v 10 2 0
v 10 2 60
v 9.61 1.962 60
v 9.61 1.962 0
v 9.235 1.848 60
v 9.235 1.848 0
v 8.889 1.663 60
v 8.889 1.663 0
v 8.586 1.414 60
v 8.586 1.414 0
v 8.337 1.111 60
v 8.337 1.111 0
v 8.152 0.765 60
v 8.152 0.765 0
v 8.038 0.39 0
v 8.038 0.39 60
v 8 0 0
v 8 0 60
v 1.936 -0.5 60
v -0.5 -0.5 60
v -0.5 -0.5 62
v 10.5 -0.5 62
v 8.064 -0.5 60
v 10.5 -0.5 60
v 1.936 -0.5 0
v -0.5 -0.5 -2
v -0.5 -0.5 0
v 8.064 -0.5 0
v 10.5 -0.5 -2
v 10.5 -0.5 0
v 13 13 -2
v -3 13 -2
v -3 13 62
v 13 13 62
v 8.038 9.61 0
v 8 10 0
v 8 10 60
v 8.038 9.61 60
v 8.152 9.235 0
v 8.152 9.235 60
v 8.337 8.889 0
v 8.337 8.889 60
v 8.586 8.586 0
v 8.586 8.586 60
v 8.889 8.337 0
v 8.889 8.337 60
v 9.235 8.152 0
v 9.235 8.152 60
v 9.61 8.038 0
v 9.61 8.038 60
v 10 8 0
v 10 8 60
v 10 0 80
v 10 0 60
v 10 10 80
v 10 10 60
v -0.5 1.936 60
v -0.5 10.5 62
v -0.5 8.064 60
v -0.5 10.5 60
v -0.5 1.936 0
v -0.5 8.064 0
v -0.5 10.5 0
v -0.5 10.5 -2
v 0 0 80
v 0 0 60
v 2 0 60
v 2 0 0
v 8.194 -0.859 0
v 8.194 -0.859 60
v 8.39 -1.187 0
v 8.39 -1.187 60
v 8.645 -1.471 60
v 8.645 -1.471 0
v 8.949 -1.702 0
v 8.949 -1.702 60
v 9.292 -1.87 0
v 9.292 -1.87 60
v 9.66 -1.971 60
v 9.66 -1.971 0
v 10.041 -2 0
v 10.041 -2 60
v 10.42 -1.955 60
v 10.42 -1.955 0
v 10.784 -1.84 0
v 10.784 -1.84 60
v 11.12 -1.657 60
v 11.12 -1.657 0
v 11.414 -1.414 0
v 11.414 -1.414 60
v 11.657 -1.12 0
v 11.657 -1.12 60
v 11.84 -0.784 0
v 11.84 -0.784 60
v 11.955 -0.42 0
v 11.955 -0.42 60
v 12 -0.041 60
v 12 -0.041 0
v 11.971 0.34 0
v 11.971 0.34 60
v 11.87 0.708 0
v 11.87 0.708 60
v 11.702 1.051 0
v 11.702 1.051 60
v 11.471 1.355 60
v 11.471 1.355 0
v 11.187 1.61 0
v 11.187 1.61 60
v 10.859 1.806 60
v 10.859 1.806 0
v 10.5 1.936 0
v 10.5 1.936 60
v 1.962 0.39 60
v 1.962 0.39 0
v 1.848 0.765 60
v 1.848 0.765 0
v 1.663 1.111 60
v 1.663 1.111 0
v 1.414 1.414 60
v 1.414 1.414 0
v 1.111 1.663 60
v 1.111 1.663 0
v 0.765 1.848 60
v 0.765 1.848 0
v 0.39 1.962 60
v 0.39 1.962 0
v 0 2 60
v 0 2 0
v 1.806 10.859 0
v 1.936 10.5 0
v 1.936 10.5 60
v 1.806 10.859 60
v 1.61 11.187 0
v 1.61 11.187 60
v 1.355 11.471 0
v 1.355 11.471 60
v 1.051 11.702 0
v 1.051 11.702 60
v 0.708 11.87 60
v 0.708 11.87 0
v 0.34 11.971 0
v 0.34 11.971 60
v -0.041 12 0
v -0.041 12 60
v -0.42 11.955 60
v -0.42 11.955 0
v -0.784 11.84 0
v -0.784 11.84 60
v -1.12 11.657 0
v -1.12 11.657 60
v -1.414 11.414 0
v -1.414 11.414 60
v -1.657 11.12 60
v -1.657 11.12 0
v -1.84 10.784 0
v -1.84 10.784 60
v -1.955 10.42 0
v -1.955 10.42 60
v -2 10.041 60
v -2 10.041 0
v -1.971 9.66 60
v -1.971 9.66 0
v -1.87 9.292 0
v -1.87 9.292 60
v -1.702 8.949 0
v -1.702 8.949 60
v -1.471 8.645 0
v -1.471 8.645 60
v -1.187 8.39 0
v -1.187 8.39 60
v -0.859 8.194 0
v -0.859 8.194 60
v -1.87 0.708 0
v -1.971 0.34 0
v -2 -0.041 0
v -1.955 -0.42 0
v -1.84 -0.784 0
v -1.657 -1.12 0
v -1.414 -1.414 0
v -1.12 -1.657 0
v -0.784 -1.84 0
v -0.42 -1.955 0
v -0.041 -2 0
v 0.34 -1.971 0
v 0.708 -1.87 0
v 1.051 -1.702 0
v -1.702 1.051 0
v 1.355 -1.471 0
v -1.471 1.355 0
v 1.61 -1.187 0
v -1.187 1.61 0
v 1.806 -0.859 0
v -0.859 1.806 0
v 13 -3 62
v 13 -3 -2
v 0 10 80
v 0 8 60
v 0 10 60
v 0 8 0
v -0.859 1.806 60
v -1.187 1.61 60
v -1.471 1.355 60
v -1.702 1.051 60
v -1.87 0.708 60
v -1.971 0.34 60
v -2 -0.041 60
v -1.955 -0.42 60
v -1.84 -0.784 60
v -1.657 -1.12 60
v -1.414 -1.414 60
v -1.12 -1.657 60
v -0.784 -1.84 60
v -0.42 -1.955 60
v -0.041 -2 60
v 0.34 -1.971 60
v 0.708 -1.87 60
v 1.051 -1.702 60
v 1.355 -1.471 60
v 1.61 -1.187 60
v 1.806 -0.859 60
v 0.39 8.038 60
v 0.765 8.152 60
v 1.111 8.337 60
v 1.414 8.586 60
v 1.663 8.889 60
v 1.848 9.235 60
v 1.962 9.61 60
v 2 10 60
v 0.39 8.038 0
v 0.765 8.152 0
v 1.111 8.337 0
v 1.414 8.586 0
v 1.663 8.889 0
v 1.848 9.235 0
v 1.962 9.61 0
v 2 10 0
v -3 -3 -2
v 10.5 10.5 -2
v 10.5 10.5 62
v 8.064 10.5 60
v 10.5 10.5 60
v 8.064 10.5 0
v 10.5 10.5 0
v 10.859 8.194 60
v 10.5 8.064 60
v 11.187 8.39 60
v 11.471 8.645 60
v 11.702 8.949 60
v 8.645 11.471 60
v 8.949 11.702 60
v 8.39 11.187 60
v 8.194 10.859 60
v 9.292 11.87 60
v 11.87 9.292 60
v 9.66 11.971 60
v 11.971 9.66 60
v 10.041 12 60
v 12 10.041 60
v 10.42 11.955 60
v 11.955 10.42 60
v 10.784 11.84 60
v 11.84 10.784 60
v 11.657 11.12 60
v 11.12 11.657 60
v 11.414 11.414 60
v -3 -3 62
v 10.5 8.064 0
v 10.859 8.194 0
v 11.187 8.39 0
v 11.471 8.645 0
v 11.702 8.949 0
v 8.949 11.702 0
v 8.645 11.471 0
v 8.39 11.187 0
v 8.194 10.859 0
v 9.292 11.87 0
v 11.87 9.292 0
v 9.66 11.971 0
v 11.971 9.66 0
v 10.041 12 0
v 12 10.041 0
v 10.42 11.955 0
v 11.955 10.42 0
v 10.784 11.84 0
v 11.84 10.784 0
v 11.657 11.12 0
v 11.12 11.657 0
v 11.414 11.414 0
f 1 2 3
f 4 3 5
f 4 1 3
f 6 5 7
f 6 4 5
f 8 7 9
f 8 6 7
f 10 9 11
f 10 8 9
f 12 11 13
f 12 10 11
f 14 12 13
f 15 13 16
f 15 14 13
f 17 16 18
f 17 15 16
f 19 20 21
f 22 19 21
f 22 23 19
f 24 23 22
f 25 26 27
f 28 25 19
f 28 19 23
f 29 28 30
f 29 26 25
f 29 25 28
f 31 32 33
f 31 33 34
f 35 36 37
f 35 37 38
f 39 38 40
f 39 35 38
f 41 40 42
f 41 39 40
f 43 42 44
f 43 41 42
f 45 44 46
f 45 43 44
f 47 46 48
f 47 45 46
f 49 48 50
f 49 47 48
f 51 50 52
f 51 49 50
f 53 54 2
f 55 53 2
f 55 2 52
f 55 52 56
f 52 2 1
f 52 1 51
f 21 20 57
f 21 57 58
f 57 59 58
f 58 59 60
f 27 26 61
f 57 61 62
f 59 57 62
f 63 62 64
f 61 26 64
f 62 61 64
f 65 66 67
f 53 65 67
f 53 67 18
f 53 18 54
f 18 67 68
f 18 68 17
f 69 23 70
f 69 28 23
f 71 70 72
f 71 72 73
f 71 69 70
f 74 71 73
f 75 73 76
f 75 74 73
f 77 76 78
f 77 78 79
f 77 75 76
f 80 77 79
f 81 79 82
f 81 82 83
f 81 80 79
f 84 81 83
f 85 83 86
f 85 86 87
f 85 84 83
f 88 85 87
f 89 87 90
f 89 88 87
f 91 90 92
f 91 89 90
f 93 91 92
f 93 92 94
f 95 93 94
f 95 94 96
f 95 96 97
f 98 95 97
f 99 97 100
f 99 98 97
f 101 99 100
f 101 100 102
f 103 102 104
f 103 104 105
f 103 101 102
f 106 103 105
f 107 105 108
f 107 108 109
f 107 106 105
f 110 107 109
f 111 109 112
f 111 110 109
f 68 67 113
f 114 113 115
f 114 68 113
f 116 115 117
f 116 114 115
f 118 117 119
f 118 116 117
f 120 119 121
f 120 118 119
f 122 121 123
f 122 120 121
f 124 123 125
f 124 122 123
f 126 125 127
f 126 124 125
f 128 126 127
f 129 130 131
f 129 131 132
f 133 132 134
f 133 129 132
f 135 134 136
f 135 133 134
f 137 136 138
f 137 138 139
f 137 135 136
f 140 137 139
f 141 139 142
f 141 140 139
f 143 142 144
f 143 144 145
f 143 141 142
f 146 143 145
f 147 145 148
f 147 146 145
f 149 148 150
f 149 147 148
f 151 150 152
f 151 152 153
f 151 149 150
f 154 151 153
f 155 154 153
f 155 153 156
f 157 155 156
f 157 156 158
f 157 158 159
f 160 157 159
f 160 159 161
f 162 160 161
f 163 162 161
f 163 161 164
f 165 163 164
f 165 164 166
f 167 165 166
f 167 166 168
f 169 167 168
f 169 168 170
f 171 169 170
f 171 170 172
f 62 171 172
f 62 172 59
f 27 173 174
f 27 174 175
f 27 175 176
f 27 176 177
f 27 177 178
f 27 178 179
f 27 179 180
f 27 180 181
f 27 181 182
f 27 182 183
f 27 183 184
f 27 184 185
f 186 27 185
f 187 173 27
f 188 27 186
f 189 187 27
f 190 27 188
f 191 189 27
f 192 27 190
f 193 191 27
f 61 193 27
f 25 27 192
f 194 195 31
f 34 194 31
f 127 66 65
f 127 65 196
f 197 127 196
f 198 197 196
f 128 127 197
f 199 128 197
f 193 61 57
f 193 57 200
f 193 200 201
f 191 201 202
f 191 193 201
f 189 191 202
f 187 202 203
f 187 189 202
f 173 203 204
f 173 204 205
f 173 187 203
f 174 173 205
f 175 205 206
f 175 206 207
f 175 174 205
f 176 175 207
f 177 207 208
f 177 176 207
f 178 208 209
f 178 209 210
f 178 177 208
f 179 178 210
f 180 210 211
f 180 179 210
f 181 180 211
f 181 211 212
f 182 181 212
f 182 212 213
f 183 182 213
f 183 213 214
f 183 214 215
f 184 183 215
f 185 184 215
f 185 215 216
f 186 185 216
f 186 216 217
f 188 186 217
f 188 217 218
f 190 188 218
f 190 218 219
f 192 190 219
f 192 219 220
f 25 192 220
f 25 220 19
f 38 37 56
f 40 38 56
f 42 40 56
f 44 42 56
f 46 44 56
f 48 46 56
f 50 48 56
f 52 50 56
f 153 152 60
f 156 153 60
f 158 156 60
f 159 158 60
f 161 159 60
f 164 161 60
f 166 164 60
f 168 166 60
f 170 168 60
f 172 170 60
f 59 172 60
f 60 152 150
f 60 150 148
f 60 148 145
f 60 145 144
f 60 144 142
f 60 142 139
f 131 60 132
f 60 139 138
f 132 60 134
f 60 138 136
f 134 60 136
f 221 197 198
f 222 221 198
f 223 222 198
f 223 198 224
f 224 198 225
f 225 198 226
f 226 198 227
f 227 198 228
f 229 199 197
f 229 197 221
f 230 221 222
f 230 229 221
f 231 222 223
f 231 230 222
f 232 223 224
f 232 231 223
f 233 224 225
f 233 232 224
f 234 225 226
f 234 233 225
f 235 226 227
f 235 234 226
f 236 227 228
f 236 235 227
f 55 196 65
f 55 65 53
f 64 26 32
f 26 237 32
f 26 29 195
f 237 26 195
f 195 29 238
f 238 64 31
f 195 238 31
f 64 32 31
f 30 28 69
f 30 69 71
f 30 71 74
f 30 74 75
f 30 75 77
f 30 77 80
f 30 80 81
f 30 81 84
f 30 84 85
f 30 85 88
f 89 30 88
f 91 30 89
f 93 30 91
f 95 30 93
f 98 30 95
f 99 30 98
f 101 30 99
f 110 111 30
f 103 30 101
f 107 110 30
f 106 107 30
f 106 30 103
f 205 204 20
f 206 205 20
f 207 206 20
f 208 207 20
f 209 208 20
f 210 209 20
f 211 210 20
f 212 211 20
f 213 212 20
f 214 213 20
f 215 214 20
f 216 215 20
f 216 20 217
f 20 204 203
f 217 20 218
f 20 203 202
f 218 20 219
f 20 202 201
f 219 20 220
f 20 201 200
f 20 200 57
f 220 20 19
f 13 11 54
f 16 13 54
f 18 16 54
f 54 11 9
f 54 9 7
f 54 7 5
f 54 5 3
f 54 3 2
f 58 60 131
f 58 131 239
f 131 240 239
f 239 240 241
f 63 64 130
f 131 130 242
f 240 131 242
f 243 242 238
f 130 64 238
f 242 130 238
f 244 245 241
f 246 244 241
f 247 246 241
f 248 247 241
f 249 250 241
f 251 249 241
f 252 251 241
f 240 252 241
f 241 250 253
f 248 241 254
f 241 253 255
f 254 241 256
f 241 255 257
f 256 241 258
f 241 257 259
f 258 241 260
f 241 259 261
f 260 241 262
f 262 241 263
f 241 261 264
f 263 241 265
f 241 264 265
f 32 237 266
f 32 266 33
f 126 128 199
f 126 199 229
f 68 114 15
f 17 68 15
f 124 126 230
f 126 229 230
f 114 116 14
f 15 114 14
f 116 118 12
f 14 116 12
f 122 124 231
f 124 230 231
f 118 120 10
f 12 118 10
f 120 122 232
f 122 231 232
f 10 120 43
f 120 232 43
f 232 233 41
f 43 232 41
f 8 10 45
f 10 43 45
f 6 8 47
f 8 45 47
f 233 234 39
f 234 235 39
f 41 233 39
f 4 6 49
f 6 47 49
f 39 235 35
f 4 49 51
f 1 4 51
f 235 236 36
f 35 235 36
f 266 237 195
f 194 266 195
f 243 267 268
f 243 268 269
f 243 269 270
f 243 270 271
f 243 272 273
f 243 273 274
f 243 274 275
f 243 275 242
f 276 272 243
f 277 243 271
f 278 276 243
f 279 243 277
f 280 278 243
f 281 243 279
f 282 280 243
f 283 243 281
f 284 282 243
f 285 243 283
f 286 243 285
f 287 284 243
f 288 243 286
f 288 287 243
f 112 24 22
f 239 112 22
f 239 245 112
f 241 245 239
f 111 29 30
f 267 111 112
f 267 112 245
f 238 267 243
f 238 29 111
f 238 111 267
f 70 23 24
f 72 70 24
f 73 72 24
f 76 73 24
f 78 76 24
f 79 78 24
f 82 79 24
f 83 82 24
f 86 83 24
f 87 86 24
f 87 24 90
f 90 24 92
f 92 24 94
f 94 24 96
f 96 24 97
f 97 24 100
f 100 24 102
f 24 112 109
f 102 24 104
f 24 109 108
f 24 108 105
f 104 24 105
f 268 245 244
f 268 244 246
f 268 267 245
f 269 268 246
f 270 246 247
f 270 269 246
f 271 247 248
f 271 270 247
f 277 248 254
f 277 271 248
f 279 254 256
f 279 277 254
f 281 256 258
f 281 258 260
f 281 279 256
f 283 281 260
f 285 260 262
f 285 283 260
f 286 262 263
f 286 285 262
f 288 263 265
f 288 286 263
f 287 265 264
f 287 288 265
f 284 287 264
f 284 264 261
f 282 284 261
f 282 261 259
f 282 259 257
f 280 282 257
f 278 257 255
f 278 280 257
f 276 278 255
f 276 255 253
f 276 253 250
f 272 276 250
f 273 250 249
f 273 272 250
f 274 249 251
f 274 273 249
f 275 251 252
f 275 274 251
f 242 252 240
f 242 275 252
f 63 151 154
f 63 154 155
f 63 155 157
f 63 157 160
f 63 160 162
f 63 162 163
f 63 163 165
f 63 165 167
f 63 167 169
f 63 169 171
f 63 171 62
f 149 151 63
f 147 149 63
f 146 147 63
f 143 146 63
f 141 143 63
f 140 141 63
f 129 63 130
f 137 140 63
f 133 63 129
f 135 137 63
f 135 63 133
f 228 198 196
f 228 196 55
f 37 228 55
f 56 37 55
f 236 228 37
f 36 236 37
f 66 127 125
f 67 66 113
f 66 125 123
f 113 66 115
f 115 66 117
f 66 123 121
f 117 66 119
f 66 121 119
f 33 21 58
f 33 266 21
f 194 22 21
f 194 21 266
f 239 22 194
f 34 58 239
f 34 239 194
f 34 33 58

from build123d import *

# Parameters (mm, degrees)
CYLINDER005_R     = 2
CYLINDER005_DEPTH = 60
CYLINDER006_R     = 2
CYLINDER006_DEPTH = 60
CYLINDER007_R     = 2
CYLINDER007_DEPTH = 60
CYLINDER004_R     = 2
CYLINDER004_DEPTH = 60
BOX_W             = 10
BOX_H             = 10
BOX_DEPTH         = 80
CYLINDER_R        = 2
CYLINDER_DEPTH    = 60
CYLINDER002_R     = 2
CYLINDER002_DEPTH = 60
CYLINDER001_R     = 2
CYLINDER001_DEPTH = 60
CYLINDER003_R     = 2
CYLINDER003_DEPTH = 60
BOX002_W          = 11
BOX002_H          = 11
BOX002_DEPTH      = 80
BOX001_W          = 16
BOX001_H          = 16
BOX001_DEPTH      = 64


with BuildPart() as cylinder005:
    # Cylinder005 → Cylinder005 (new body)
    with BuildSketch(Plane(origin=(0, 10, 0), x_dir=(1, 0, 0), z_dir=(0, 0, 1))):
        Circle(CYLINDER005_R)
    extrude(amount=CYLINDER005_DEPTH)


with BuildPart() as cylinder006:
    # Cylinder006 → Cylinder006 (new body)
    with BuildSketch(Plane(origin=(10, 10, 0), x_dir=(1, 0, 0), z_dir=(0, 0, 1))):
        Circle(CYLINDER006_R)
    extrude(amount=CYLINDER006_DEPTH)


with BuildPart() as cylinder007:
    # Cylinder007 → Cylinder007 (new body)
    with BuildSketch(Plane(origin=(10, 0, 0), x_dir=(1, 0, 0), z_dir=(0, 0, 1))):
        Circle(CYLINDER007_R)
    extrude(amount=CYLINDER007_DEPTH)


with BuildPart() as cylinder004:
    # Cylinder004 → Cylinder004 (new body)
    with BuildSketch(Plane.XY):
        Circle(CYLINDER004_R)
    extrude(amount=CYLINDER004_DEPTH)


with BuildPart() as cut003:
    # Box → Box (new body)
    with BuildSketch(Plane.XY):
        with Locations((5, 5)):
            Rectangle(BOX_W, BOX_H)
    extrude(amount=BOX_DEPTH)

    # Cut: cut Cylinder004
    add(cylinder004.part, mode=Mode.SUBTRACT)

    # Cut001: cut Cylinder007
    add(cylinder007.part, mode=Mode.SUBTRACT)

    # Cut002: cut Cylinder006
    add(cylinder006.part, mode=Mode.SUBTRACT)

    # Cut003: cut Cylinder005
    add(cylinder005.part, mode=Mode.SUBTRACT)


with BuildPart() as cylinder:
    # Cylinder → Cylinder (new body)
    with BuildSketch(Plane.XY):
        Circle(CYLINDER_R)
    extrude(amount=CYLINDER_DEPTH)


with BuildPart() as cylinder002:
    # Cylinder002 → Cylinder002 (new body)
    with BuildSketch(Plane(origin=(10, 10, 0), x_dir=(1, 0, 0), z_dir=(0, 0, 1))):
        Circle(CYLINDER002_R)
    extrude(amount=CYLINDER002_DEPTH)


with BuildPart() as cylinder001:
    # Cylinder001 → Cylinder001 (new body)
    with BuildSketch(Plane(origin=(10, 0, 0), x_dir=(1, 0, 0), z_dir=(0, 0, 1))):
        Circle(CYLINDER001_R)
    extrude(amount=CYLINDER001_DEPTH)


with BuildPart() as cylinder003:
    # Cylinder003 → Cylinder003 (new body)
    with BuildSketch(Plane(origin=(0, 10, 0), x_dir=(1, 0, 0), z_dir=(0, 0, 1))):
        Circle(CYLINDER003_R)
    extrude(amount=CYLINDER003_DEPTH)


with BuildPart() as cube002:
    # Box002 → Box002 (new body)
    with BuildSketch(Plane(origin=(-0.5, -0.5, -5), x_dir=(1, 0, 0), z_dir=(0, 0, 1))):
        with Locations((5.5, 5.5)):
            Rectangle(BOX002_W, BOX002_H)
    extrude(amount=BOX002_DEPTH)


with BuildPart() as cut008:
    # Box001 → Box001 (new body)
    with BuildSketch(Plane(origin=(-3, -3, -2), x_dir=(1, 0, 0), z_dir=(0, 0, 1))):
        with Locations((8, 8)):
            Rectangle(BOX001_W, BOX001_H)
    extrude(amount=BOX001_DEPTH)

    # Cut004: cut Cube002
    add(cube002.part, mode=Mode.SUBTRACT)

    # Cut005: cut Cylinder003
    add(cylinder003.part, mode=Mode.SUBTRACT)

    # Cut006: cut Cylinder001
    add(cylinder001.part, mode=Mode.SUBTRACT)

    # Cut007: cut Cylinder002
    add(cylinder002.part, mode=Mode.SUBTRACT)

    # Cut008: cut Cylinder
    add(cylinder.part, mode=Mode.SUBTRACT)


solid = Compound([cut003.part, cut008.part])
